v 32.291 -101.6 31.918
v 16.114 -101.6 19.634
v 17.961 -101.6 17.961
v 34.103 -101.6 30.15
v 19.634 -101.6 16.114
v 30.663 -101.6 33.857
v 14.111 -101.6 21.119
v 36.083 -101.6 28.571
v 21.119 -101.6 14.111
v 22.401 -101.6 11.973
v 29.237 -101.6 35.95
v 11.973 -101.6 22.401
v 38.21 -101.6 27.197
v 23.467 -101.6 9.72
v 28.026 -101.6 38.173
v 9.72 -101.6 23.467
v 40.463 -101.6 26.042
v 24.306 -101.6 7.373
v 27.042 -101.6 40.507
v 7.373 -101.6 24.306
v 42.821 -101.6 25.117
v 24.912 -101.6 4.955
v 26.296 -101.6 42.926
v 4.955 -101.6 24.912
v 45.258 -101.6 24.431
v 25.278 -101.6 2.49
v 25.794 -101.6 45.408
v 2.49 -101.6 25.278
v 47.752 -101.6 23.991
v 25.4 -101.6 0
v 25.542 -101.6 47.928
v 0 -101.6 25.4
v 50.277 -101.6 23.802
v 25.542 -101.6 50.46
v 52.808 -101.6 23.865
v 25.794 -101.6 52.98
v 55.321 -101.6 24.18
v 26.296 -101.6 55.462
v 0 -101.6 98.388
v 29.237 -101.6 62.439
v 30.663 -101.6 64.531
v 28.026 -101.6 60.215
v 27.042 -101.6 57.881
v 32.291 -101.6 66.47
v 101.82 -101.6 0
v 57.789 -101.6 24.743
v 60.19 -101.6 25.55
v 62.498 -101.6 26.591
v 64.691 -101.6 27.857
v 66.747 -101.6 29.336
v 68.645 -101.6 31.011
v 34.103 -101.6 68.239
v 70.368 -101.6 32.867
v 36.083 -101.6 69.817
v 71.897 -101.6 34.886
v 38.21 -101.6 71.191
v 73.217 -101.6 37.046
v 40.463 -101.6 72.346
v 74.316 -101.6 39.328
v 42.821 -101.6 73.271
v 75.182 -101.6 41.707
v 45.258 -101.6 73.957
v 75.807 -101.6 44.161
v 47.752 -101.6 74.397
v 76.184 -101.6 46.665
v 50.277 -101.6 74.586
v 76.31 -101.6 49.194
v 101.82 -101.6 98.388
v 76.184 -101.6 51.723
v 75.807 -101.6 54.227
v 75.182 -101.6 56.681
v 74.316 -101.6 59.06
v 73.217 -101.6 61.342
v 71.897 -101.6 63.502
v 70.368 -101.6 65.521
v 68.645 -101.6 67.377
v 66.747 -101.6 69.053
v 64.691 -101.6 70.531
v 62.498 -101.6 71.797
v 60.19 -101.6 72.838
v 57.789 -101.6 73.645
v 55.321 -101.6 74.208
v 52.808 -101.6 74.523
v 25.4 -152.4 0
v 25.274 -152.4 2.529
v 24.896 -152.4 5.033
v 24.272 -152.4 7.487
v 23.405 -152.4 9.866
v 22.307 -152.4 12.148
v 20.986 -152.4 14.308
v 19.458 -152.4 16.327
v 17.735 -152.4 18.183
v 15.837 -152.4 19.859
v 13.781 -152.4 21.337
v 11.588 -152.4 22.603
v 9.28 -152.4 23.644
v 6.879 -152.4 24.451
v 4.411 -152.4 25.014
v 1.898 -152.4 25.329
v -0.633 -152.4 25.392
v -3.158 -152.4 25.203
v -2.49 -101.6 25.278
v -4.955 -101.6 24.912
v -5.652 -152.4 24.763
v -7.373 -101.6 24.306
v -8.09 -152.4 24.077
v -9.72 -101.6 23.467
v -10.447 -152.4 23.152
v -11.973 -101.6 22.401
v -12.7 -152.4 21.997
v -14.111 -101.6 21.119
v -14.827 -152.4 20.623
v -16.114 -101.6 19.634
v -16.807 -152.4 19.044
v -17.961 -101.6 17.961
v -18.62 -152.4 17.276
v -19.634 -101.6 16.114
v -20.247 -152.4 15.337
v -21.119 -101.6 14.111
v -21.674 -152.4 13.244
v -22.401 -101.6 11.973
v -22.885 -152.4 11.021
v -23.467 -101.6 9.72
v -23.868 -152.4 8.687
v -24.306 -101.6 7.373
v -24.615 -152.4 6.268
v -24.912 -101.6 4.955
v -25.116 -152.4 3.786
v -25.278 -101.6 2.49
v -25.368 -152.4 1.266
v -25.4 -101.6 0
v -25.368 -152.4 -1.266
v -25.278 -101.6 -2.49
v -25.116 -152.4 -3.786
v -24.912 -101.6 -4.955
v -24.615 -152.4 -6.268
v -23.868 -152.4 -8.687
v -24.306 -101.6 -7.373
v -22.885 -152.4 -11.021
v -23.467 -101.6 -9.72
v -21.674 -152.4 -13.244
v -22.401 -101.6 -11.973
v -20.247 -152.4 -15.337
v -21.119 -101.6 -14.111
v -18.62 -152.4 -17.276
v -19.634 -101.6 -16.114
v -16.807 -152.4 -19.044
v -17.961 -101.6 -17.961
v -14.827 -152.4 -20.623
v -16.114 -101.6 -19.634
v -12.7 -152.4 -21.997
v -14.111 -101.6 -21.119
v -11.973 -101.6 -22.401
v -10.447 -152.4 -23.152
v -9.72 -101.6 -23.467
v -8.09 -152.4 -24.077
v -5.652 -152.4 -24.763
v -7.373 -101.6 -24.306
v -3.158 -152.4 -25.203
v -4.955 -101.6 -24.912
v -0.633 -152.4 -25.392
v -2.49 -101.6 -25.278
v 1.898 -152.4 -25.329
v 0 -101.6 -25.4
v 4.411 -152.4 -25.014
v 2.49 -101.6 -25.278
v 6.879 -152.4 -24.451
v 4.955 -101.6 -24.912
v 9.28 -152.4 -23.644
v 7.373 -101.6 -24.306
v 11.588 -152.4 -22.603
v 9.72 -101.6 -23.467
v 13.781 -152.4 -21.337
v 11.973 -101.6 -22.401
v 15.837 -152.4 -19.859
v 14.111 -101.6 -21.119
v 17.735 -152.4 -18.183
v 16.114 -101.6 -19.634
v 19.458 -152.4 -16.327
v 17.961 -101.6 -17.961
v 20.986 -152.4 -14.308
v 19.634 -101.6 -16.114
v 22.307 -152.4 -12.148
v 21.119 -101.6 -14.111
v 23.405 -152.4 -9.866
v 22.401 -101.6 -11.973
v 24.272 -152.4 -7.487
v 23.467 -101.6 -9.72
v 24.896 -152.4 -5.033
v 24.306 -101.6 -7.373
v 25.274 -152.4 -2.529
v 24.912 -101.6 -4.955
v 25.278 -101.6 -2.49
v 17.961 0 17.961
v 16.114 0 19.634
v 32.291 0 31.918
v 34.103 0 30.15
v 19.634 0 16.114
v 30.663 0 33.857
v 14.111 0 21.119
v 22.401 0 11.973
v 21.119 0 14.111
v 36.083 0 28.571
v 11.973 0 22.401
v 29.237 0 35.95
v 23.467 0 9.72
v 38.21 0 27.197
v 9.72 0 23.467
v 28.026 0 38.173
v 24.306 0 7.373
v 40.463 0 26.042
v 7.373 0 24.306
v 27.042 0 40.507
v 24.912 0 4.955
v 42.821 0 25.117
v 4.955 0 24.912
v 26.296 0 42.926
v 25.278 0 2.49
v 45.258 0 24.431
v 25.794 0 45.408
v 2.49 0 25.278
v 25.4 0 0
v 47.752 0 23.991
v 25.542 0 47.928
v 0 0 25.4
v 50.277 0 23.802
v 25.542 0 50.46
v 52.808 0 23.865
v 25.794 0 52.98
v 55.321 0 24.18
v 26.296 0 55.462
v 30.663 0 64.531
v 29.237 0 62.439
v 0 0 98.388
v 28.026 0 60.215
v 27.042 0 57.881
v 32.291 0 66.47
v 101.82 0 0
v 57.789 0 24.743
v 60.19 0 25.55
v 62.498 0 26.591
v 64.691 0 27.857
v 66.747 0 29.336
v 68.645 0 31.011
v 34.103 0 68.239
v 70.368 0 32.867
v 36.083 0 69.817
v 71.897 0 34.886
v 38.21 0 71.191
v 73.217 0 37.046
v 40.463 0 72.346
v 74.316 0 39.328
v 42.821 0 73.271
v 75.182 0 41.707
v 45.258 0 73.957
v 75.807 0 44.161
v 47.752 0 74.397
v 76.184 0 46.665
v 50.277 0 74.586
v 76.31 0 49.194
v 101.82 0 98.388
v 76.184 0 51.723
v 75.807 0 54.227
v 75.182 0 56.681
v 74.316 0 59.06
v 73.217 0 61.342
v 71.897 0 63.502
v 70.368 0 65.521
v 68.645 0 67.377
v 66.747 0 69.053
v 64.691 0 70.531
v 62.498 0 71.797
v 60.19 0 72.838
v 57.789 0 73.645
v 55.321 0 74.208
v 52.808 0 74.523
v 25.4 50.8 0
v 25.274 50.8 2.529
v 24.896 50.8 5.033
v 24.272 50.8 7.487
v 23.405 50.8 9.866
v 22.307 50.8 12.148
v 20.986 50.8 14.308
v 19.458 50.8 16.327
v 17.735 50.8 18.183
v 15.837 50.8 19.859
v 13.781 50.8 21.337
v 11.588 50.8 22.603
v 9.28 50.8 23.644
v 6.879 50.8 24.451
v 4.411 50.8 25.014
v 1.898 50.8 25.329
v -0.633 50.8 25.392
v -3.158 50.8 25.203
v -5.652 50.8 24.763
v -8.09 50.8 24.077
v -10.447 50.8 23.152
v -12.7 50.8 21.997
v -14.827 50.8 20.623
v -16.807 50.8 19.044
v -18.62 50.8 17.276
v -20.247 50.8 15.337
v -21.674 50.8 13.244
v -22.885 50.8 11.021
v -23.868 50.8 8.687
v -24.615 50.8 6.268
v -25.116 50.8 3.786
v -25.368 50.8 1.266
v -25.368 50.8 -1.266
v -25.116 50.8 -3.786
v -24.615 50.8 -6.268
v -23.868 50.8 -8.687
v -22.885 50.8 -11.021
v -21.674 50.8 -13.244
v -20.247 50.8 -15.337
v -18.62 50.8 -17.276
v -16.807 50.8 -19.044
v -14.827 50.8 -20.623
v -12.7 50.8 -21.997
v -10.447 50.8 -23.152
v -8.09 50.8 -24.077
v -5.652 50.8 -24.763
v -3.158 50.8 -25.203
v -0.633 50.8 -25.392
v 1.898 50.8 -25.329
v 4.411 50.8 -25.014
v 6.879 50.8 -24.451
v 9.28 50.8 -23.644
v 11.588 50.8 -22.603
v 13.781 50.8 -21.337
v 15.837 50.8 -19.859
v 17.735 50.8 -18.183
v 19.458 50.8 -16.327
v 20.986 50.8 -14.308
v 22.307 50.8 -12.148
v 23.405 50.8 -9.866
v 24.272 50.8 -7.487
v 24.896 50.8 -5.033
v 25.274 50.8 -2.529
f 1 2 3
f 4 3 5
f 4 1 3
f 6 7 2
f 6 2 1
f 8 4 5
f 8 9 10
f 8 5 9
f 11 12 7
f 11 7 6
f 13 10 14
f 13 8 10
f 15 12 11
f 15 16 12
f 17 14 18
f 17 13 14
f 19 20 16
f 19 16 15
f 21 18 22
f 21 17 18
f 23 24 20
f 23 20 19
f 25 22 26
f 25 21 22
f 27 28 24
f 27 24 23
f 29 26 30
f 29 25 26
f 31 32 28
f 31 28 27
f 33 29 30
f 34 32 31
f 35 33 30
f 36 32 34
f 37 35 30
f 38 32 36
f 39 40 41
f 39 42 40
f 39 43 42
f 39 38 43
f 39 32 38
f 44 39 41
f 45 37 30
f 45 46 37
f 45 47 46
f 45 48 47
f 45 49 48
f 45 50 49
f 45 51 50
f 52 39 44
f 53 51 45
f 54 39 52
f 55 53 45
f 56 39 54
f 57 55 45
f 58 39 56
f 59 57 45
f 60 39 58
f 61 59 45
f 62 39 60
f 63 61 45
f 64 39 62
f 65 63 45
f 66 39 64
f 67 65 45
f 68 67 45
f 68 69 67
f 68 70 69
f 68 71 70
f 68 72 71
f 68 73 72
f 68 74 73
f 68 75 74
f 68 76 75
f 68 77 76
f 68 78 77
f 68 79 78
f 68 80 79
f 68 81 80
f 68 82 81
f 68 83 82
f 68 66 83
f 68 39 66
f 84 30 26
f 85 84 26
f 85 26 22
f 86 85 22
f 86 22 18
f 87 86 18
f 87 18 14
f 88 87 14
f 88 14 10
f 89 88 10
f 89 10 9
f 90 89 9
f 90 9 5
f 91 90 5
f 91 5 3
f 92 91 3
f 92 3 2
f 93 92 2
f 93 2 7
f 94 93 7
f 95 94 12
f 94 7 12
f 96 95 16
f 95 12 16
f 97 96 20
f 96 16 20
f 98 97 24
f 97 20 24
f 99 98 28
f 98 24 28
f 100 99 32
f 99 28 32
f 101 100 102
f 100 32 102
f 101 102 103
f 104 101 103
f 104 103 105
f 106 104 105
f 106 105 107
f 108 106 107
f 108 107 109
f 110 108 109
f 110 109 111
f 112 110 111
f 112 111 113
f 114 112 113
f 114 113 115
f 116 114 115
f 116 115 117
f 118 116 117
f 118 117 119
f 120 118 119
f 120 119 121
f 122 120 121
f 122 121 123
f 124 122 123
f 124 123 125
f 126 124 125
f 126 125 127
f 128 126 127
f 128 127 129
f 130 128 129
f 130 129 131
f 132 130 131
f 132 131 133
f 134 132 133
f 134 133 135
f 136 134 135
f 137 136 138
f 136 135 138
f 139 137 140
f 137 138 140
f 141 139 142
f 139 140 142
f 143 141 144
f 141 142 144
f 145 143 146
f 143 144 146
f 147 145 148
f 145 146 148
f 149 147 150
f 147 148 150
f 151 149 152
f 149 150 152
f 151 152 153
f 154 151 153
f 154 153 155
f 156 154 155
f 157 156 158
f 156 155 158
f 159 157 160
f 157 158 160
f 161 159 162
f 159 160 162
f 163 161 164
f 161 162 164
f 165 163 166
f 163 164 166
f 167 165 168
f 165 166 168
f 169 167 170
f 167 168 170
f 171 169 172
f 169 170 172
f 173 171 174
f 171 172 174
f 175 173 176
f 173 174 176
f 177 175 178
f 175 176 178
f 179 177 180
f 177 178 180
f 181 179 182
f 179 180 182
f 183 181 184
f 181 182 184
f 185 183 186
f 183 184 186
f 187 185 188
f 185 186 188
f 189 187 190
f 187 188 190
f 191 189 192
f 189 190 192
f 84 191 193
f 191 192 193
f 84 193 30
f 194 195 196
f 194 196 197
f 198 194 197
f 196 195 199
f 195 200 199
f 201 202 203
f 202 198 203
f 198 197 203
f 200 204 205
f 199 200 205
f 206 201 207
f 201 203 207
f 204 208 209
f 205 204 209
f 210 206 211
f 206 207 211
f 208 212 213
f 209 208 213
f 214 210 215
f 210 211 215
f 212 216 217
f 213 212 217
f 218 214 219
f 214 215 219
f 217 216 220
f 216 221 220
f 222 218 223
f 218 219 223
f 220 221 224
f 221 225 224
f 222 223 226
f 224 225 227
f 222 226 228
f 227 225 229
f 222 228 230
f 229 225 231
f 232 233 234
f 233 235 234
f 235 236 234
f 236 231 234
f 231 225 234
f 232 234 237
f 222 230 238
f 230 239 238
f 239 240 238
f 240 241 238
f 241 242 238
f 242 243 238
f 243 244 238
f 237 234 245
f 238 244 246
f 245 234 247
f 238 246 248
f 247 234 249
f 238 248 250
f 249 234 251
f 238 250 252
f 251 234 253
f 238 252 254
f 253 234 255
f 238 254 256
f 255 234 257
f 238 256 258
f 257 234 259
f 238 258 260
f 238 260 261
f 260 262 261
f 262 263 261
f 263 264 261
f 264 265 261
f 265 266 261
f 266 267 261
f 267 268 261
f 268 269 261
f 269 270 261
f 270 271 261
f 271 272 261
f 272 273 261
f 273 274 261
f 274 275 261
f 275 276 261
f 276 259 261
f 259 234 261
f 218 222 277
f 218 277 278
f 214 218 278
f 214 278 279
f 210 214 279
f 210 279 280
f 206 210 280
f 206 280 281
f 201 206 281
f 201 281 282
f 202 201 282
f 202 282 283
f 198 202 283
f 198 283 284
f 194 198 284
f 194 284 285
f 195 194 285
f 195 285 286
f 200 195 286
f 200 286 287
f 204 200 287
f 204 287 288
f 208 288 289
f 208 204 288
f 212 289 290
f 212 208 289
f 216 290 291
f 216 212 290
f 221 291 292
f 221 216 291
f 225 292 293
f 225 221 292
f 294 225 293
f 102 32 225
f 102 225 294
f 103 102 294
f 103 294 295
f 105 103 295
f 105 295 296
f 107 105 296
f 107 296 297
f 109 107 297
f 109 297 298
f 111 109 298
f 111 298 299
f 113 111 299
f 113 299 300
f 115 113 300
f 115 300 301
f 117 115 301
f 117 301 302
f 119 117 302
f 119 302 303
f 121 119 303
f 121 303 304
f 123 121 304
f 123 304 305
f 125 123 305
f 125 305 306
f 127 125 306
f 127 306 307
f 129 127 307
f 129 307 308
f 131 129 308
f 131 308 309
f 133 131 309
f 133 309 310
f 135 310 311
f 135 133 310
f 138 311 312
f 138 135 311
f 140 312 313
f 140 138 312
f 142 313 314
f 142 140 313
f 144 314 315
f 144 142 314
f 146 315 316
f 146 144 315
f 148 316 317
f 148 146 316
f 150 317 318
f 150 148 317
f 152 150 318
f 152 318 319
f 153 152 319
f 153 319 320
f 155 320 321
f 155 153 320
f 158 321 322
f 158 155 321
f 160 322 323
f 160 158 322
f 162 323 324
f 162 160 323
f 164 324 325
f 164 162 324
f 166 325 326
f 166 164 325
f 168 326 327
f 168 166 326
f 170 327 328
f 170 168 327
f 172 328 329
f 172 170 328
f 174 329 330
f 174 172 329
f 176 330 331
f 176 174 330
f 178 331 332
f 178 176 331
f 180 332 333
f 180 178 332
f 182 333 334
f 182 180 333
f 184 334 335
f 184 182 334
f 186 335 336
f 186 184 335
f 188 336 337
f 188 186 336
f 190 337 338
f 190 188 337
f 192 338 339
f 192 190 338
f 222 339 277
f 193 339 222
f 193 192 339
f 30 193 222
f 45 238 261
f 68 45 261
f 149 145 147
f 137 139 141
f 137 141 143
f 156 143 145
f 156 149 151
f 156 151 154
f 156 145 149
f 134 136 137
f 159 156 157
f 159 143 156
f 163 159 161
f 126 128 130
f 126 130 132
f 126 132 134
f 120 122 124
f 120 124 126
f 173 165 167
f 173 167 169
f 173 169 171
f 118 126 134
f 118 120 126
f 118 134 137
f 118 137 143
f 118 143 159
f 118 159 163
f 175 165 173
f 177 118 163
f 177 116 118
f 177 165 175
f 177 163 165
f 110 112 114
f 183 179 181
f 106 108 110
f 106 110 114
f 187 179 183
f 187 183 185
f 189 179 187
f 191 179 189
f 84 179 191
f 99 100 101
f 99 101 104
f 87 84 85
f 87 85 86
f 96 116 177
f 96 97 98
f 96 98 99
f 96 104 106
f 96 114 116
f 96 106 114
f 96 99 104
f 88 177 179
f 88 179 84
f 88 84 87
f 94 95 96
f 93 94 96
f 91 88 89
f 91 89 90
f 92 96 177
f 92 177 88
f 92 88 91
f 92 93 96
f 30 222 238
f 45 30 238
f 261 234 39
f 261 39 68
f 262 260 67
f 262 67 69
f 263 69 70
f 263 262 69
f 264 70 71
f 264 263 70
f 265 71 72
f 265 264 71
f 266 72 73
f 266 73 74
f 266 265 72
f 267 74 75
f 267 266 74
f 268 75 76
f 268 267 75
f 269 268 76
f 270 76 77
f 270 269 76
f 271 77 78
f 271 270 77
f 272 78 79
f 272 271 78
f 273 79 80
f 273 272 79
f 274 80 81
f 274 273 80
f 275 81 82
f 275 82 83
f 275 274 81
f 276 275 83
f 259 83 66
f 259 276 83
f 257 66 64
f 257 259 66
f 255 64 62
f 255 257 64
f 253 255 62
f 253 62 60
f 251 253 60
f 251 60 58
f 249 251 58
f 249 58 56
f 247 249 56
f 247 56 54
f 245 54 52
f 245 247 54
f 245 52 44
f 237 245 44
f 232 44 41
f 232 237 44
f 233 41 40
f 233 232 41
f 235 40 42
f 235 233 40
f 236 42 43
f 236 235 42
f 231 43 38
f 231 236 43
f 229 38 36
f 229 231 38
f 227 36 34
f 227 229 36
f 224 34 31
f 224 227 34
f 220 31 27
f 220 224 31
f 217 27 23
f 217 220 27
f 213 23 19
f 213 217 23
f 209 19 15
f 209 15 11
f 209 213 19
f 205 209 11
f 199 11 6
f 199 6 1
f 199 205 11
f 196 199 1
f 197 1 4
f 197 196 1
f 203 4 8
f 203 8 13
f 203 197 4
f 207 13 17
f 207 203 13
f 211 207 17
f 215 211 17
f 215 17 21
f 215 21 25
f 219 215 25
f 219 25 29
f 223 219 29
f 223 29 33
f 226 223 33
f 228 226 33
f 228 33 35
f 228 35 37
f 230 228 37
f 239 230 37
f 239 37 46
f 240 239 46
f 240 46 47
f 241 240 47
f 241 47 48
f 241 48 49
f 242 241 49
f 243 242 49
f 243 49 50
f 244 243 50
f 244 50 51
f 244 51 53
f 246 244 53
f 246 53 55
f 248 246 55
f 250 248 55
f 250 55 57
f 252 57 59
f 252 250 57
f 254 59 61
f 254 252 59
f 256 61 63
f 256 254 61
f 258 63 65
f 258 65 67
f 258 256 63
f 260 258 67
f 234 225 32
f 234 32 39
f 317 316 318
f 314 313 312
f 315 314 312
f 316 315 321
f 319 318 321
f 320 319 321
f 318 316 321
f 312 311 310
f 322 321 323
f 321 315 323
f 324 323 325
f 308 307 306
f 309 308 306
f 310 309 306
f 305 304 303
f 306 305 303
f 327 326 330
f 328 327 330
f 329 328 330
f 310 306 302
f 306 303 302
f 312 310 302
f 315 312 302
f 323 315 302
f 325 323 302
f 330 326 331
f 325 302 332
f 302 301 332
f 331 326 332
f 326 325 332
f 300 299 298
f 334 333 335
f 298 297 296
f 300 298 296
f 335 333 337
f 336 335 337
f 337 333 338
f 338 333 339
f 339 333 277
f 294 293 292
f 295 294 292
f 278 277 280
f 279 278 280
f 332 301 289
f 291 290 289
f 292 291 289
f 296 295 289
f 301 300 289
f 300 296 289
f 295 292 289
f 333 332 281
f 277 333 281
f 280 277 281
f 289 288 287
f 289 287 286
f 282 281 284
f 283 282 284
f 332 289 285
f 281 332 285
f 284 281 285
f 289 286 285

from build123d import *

# Parameters (mm, degrees)
F0_W          = 101.8202751875
F0_H          = 98.3881354332
F0_R          = 25.4
F1_DEPTH      = 101.6
F4_R          = 25.4
F5_DEPTH      = 50.8
F5_DEPTH_BACK = 152.4


# Not quite as in the source:
# - a feature of the source that left no trace in its solid (it failed there, or was rolled back) is left out


with BuildPart() as f1:
    # F0 (on Front) → F1 (new body)
    with BuildSketch(Plane.XZ):
        with Locations((50.9101375937, 49.1940677166)):
            Rectangle(F0_W, F0_H)
        with Locations((50.9101375937, 49.1940677166)):
            Circle(F0_R, mode=Mode.SUBTRACT)
    extrude(amount=F1_DEPTH)

    # F4 (on offset) → F5 (join, two sides)
    with BuildSketch(Plane.XZ.offset(101.6)) as f5_sk:
        Circle(F4_R)
    extrude(amount=F5_DEPTH)
    extrude(f5_sk.sketch, amount=-F5_DEPTH_BACK)


solid = f1.part
